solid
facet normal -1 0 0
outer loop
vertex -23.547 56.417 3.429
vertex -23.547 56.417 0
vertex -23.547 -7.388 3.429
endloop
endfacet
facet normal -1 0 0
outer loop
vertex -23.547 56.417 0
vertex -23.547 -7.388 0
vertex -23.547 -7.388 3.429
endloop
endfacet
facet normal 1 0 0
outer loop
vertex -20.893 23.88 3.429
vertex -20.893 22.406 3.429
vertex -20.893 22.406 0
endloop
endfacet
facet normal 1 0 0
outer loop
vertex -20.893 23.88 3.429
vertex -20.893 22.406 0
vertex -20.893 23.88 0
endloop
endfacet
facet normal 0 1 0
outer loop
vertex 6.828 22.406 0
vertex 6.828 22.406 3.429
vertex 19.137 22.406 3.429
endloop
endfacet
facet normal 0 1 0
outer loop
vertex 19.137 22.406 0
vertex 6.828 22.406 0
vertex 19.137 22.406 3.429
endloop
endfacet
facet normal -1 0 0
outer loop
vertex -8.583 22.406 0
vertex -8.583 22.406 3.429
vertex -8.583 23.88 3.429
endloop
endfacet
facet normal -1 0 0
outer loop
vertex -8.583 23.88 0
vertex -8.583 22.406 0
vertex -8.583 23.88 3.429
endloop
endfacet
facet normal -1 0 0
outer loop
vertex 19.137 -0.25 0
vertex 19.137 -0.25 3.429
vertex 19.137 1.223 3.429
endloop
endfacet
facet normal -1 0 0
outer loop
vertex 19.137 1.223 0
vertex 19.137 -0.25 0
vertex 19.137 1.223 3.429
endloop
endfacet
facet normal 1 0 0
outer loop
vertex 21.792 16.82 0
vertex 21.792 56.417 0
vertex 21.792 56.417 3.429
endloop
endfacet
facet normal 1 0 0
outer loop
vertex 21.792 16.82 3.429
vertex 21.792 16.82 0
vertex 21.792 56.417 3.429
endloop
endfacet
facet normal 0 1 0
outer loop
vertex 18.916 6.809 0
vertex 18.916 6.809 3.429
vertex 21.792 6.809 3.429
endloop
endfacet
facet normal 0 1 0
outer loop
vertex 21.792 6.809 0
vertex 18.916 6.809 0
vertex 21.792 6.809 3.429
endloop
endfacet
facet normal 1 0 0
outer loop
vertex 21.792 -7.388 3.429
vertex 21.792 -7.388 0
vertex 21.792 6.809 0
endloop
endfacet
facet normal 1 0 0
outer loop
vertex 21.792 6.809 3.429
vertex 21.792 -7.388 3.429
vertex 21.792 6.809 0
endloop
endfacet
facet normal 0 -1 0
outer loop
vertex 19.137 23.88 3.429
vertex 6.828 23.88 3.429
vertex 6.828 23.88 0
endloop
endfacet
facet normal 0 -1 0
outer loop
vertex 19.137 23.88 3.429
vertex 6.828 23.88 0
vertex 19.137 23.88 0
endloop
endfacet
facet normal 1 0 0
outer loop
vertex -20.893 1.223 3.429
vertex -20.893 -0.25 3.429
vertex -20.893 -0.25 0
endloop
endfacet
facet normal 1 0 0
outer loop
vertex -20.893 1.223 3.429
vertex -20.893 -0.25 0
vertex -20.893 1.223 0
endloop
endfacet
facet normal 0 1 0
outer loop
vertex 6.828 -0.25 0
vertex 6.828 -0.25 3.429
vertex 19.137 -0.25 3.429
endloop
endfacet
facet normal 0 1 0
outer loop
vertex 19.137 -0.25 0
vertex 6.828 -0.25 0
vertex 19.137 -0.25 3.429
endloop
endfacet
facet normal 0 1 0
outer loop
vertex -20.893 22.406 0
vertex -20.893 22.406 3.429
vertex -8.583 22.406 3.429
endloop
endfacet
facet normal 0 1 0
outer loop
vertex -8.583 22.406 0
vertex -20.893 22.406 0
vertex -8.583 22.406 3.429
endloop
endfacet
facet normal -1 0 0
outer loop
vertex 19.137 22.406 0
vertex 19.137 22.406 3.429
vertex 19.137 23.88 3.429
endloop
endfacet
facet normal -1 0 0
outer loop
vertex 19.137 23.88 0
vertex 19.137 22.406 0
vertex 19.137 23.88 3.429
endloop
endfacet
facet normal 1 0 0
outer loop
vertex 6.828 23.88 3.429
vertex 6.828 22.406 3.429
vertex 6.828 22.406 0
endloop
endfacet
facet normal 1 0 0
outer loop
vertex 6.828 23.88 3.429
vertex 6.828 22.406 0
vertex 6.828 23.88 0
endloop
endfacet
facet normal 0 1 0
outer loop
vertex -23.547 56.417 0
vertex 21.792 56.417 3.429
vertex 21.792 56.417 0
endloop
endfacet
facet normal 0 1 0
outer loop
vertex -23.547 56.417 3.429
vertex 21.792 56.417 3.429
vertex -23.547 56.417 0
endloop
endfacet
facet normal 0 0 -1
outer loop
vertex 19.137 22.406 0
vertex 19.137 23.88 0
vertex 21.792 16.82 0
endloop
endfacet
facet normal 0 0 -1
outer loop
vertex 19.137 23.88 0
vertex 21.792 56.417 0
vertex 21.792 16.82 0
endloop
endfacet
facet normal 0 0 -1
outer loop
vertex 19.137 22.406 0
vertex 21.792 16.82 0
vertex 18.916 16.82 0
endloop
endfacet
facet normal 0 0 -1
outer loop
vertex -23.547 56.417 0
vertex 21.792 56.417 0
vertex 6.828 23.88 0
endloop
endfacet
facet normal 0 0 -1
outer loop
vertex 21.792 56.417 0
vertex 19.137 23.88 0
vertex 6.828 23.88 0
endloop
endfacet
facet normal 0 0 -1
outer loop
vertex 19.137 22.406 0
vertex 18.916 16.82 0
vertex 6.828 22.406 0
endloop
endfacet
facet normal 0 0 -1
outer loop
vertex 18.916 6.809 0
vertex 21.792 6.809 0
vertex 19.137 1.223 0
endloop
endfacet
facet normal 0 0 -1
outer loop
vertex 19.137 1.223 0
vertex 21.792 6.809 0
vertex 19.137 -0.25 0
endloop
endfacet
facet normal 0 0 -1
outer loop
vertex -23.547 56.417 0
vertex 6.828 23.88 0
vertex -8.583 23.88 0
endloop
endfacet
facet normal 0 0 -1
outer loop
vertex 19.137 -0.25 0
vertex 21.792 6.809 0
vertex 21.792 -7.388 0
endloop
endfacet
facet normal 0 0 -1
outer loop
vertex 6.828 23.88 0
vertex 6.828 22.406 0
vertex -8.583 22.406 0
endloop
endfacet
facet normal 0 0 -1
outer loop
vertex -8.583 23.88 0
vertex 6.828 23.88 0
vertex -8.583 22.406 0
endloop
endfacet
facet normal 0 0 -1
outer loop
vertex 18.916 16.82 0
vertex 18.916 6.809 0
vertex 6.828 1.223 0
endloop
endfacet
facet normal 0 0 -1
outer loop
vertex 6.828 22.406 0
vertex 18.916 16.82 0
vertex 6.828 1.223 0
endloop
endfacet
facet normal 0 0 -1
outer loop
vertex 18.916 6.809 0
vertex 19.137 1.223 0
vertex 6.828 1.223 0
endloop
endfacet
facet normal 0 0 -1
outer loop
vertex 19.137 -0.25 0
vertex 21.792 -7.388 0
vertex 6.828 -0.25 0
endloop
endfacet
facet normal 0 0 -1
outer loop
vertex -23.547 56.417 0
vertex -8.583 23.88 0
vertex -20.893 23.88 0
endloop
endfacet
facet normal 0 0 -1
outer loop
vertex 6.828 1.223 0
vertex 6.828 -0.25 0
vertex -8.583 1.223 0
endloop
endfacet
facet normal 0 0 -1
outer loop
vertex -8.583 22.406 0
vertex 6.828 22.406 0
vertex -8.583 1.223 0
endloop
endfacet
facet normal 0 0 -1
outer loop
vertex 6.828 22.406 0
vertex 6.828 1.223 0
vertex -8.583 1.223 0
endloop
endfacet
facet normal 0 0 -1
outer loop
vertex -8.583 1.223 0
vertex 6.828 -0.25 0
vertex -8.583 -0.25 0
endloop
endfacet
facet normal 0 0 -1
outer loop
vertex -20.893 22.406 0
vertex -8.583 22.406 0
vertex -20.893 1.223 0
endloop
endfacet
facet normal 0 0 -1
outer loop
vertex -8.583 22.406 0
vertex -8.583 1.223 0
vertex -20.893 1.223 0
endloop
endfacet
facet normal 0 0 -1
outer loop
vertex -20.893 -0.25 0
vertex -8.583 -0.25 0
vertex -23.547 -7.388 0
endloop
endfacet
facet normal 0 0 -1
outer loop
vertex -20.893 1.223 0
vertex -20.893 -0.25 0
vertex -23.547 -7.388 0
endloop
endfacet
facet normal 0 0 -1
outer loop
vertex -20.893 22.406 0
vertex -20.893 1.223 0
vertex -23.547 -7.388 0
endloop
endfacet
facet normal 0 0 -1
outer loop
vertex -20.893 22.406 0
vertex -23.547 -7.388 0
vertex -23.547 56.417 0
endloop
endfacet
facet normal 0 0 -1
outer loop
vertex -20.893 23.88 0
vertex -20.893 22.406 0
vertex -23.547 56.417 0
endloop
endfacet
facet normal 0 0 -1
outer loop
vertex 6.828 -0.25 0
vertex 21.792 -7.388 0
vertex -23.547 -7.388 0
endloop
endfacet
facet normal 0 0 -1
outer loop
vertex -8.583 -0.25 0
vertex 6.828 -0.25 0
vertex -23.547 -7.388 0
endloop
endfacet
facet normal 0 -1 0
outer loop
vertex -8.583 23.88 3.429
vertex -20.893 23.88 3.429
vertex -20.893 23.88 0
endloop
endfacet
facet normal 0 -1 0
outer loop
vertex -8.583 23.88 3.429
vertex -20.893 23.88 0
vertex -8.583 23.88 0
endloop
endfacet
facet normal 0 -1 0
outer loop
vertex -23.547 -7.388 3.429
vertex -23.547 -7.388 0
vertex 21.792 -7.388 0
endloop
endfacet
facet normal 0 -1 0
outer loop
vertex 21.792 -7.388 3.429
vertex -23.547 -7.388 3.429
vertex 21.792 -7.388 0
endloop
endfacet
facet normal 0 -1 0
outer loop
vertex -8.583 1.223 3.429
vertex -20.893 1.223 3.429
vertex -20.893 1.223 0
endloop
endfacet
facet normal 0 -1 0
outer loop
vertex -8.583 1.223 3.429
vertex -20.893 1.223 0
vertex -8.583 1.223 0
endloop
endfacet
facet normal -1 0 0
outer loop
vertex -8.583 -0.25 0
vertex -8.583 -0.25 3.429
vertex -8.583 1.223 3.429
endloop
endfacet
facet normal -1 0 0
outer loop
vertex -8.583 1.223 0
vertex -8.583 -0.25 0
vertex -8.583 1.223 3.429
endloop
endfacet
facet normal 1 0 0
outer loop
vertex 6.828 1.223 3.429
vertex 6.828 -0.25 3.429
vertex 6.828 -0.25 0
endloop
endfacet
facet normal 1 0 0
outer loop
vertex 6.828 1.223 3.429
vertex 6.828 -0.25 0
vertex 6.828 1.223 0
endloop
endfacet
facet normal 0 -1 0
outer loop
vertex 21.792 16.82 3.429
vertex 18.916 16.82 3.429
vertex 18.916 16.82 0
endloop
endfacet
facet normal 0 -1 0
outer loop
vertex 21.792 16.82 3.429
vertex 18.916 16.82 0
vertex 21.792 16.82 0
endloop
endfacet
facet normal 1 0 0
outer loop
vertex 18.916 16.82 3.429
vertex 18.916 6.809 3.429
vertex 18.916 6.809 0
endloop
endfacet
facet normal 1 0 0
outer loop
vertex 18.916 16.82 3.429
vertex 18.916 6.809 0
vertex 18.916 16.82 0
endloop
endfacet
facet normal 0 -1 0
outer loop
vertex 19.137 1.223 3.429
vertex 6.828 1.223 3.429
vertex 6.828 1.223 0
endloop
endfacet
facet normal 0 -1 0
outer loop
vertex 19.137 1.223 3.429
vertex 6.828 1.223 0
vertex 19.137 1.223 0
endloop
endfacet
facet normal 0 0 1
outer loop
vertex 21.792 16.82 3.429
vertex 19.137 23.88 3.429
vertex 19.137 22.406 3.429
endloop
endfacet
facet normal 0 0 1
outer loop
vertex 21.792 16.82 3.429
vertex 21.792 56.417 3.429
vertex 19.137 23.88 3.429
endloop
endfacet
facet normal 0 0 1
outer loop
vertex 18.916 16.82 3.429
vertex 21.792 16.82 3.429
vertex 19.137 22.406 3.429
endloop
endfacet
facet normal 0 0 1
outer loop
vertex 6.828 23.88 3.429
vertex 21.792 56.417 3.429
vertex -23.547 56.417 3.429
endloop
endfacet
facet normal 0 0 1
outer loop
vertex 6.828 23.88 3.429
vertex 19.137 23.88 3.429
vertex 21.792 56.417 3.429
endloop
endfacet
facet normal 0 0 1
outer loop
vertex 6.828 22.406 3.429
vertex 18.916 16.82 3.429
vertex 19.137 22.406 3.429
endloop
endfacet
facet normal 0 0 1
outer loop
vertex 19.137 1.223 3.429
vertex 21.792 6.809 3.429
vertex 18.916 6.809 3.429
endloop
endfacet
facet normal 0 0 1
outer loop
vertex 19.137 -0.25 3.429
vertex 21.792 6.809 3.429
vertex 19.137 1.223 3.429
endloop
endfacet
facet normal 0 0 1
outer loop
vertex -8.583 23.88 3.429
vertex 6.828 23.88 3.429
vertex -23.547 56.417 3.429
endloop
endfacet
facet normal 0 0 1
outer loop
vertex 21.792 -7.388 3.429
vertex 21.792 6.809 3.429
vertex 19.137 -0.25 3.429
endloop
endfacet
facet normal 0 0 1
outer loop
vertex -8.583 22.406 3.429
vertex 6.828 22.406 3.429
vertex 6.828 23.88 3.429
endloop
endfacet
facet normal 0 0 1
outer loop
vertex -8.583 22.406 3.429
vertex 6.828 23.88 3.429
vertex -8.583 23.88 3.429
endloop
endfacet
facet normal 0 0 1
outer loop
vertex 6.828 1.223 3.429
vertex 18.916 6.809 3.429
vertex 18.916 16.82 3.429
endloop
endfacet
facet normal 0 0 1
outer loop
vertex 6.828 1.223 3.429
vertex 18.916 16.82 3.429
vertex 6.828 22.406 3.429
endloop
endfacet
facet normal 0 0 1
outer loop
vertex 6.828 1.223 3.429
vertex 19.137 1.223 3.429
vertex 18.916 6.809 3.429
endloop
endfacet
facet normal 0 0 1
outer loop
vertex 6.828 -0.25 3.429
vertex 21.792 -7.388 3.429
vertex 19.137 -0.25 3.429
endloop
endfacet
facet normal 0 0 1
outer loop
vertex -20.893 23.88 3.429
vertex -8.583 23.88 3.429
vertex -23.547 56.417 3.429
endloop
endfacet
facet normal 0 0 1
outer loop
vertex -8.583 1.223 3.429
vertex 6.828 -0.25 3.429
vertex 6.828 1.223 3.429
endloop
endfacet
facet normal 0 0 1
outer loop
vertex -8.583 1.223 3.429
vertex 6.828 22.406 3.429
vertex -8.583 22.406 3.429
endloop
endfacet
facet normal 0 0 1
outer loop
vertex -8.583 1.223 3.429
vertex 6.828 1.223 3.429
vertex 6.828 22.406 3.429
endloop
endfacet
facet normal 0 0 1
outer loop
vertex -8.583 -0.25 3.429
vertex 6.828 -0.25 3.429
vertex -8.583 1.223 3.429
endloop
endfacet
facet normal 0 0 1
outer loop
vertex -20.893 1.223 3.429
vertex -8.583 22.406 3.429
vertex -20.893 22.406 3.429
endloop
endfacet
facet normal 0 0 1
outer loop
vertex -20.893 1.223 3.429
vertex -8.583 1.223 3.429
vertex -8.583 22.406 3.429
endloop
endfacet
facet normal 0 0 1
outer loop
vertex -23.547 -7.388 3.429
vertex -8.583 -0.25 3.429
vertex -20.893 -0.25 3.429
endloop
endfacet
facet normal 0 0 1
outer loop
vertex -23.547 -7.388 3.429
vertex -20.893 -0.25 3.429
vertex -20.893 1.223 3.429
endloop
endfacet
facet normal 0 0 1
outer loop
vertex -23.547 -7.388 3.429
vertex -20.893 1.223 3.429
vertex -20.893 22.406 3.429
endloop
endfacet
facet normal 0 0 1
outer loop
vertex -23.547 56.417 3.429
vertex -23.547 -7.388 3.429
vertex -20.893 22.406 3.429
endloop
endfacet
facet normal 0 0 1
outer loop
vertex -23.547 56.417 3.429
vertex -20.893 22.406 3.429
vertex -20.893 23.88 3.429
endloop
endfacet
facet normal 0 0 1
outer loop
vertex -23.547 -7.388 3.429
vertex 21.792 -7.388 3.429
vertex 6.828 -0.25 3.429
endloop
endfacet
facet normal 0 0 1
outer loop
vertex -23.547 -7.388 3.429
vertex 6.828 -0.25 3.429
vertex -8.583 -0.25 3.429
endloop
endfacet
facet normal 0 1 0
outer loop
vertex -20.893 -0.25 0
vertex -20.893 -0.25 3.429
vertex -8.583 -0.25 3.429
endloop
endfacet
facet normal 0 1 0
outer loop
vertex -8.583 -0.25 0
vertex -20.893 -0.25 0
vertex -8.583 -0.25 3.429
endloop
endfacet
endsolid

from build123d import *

# Parameters (mm, degrees)
F0_W     = 45.339
F0_H     = 38.4048
F1_DEPTH = 3.429
F2_W     = 12.309304
F2_H     = 1.4732
F2_W_2   = 5.751361
F2_H_2   = 10.011873
F3_DEPTH = 25.4
F4_W     = 45.339
F4_H     = 3.429
F5_DEPTH = 25.4


with BuildPart() as f1:
    # F0 (on Top) → F1 (new body)
    with BuildSketch(Plane.XY):
        with Locations((-0.877853, 11.814515)):
            Rectangle(F0_W, F0_H)
    extrude(amount=F1_DEPTH)

    # F2 (on face) → F3 (cut)
    with BuildSketch(Plane.XY.offset(3.429)):
        with Locations((-14.737868, 23.142915)):
            Rectangle(F2_W, F2_H)
        with Locations((12.982161, 23.142915)):
            Rectangle(F2_W, F2_H)
        with Locations((-14.737868, 0.486115)):
            Rectangle(F2_W, F2_H)
        with Locations((12.982161, 0.486115)):
            Rectangle(F2_W, F2_H)
        with Locations((21.791646, 11.814514)):
            Rectangle(F2_W_2, F2_H_2)
    extrude(amount=-F3_DEPTH, mode=Mode.SUBTRACT)

    # F4 (on face) → F5 (join)
    with BuildSketch(Plane(origin=(0, 31.016915, 0), x_dir=(-1, 0, 0), z_dir=(0, 1, 0))):
        with Locations((0.877853, 1.7145)):
            Rectangle(F4_W, F4_H)
    extrude(amount=F5_DEPTH)


solid = f1.part
